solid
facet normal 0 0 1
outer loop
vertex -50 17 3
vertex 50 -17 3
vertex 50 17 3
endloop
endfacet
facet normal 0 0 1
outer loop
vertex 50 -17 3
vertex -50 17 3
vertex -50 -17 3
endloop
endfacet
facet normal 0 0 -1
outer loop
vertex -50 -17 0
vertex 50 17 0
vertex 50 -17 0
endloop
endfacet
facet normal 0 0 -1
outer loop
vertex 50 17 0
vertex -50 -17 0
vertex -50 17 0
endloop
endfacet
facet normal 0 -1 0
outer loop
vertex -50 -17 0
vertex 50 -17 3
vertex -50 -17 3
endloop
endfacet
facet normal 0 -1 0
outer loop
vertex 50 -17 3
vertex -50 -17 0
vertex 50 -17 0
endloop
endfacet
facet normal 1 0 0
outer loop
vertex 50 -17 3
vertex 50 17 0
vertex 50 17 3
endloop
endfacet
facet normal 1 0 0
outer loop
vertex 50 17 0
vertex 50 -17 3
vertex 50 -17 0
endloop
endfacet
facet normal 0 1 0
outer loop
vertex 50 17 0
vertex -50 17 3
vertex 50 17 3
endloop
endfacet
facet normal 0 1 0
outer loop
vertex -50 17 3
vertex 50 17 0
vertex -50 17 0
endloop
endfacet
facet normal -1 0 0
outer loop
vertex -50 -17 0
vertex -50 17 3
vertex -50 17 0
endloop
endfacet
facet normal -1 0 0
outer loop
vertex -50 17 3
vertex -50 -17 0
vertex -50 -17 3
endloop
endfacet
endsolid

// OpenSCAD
// =====================================================================
// foam_pad.scad — 独立気泡フォーム パッド 簡易モデル (購入品・切り出し)
//
// LiPo をベイの中で拘束するための発泡パッド。剛体 (PLA) で挟むと LiPo の膨張と
// 振動を逃がせないので、ここだけは 3D プリント部品ではなくフォームにする。
// 印刷対象ではない。シート (EPDM/PE 独立気泡、3mm / 2mm / 1.5mm 厚) から切る。
//
// 原点: 底面中心。l = X、w = Y、t = +Z (厚み)。
// =====================================================================

/* [寸法] */
l = 100;   // 長さ (X)
w = 34;    // 幅 (Y)
t = 3;     // 厚み (Z)

assert(l > 0 && w > 0 && t > 0, "寸法が不正");

service_cut=false;
difference(){
 translate([-l/2,-w/2,0]) cube([l,w,t]);
 // AF5.5 nut corners need a 3.4 mm radial envelope (old round boss: R3.1).
 if(service_cut) translate([38,-13,4.5]) rotate([-90,0,0]) cylinder(r=3.4,h=6,$fn=48);
}

echo(str("foam_pad ", l, " x ", w, " x ", t));
